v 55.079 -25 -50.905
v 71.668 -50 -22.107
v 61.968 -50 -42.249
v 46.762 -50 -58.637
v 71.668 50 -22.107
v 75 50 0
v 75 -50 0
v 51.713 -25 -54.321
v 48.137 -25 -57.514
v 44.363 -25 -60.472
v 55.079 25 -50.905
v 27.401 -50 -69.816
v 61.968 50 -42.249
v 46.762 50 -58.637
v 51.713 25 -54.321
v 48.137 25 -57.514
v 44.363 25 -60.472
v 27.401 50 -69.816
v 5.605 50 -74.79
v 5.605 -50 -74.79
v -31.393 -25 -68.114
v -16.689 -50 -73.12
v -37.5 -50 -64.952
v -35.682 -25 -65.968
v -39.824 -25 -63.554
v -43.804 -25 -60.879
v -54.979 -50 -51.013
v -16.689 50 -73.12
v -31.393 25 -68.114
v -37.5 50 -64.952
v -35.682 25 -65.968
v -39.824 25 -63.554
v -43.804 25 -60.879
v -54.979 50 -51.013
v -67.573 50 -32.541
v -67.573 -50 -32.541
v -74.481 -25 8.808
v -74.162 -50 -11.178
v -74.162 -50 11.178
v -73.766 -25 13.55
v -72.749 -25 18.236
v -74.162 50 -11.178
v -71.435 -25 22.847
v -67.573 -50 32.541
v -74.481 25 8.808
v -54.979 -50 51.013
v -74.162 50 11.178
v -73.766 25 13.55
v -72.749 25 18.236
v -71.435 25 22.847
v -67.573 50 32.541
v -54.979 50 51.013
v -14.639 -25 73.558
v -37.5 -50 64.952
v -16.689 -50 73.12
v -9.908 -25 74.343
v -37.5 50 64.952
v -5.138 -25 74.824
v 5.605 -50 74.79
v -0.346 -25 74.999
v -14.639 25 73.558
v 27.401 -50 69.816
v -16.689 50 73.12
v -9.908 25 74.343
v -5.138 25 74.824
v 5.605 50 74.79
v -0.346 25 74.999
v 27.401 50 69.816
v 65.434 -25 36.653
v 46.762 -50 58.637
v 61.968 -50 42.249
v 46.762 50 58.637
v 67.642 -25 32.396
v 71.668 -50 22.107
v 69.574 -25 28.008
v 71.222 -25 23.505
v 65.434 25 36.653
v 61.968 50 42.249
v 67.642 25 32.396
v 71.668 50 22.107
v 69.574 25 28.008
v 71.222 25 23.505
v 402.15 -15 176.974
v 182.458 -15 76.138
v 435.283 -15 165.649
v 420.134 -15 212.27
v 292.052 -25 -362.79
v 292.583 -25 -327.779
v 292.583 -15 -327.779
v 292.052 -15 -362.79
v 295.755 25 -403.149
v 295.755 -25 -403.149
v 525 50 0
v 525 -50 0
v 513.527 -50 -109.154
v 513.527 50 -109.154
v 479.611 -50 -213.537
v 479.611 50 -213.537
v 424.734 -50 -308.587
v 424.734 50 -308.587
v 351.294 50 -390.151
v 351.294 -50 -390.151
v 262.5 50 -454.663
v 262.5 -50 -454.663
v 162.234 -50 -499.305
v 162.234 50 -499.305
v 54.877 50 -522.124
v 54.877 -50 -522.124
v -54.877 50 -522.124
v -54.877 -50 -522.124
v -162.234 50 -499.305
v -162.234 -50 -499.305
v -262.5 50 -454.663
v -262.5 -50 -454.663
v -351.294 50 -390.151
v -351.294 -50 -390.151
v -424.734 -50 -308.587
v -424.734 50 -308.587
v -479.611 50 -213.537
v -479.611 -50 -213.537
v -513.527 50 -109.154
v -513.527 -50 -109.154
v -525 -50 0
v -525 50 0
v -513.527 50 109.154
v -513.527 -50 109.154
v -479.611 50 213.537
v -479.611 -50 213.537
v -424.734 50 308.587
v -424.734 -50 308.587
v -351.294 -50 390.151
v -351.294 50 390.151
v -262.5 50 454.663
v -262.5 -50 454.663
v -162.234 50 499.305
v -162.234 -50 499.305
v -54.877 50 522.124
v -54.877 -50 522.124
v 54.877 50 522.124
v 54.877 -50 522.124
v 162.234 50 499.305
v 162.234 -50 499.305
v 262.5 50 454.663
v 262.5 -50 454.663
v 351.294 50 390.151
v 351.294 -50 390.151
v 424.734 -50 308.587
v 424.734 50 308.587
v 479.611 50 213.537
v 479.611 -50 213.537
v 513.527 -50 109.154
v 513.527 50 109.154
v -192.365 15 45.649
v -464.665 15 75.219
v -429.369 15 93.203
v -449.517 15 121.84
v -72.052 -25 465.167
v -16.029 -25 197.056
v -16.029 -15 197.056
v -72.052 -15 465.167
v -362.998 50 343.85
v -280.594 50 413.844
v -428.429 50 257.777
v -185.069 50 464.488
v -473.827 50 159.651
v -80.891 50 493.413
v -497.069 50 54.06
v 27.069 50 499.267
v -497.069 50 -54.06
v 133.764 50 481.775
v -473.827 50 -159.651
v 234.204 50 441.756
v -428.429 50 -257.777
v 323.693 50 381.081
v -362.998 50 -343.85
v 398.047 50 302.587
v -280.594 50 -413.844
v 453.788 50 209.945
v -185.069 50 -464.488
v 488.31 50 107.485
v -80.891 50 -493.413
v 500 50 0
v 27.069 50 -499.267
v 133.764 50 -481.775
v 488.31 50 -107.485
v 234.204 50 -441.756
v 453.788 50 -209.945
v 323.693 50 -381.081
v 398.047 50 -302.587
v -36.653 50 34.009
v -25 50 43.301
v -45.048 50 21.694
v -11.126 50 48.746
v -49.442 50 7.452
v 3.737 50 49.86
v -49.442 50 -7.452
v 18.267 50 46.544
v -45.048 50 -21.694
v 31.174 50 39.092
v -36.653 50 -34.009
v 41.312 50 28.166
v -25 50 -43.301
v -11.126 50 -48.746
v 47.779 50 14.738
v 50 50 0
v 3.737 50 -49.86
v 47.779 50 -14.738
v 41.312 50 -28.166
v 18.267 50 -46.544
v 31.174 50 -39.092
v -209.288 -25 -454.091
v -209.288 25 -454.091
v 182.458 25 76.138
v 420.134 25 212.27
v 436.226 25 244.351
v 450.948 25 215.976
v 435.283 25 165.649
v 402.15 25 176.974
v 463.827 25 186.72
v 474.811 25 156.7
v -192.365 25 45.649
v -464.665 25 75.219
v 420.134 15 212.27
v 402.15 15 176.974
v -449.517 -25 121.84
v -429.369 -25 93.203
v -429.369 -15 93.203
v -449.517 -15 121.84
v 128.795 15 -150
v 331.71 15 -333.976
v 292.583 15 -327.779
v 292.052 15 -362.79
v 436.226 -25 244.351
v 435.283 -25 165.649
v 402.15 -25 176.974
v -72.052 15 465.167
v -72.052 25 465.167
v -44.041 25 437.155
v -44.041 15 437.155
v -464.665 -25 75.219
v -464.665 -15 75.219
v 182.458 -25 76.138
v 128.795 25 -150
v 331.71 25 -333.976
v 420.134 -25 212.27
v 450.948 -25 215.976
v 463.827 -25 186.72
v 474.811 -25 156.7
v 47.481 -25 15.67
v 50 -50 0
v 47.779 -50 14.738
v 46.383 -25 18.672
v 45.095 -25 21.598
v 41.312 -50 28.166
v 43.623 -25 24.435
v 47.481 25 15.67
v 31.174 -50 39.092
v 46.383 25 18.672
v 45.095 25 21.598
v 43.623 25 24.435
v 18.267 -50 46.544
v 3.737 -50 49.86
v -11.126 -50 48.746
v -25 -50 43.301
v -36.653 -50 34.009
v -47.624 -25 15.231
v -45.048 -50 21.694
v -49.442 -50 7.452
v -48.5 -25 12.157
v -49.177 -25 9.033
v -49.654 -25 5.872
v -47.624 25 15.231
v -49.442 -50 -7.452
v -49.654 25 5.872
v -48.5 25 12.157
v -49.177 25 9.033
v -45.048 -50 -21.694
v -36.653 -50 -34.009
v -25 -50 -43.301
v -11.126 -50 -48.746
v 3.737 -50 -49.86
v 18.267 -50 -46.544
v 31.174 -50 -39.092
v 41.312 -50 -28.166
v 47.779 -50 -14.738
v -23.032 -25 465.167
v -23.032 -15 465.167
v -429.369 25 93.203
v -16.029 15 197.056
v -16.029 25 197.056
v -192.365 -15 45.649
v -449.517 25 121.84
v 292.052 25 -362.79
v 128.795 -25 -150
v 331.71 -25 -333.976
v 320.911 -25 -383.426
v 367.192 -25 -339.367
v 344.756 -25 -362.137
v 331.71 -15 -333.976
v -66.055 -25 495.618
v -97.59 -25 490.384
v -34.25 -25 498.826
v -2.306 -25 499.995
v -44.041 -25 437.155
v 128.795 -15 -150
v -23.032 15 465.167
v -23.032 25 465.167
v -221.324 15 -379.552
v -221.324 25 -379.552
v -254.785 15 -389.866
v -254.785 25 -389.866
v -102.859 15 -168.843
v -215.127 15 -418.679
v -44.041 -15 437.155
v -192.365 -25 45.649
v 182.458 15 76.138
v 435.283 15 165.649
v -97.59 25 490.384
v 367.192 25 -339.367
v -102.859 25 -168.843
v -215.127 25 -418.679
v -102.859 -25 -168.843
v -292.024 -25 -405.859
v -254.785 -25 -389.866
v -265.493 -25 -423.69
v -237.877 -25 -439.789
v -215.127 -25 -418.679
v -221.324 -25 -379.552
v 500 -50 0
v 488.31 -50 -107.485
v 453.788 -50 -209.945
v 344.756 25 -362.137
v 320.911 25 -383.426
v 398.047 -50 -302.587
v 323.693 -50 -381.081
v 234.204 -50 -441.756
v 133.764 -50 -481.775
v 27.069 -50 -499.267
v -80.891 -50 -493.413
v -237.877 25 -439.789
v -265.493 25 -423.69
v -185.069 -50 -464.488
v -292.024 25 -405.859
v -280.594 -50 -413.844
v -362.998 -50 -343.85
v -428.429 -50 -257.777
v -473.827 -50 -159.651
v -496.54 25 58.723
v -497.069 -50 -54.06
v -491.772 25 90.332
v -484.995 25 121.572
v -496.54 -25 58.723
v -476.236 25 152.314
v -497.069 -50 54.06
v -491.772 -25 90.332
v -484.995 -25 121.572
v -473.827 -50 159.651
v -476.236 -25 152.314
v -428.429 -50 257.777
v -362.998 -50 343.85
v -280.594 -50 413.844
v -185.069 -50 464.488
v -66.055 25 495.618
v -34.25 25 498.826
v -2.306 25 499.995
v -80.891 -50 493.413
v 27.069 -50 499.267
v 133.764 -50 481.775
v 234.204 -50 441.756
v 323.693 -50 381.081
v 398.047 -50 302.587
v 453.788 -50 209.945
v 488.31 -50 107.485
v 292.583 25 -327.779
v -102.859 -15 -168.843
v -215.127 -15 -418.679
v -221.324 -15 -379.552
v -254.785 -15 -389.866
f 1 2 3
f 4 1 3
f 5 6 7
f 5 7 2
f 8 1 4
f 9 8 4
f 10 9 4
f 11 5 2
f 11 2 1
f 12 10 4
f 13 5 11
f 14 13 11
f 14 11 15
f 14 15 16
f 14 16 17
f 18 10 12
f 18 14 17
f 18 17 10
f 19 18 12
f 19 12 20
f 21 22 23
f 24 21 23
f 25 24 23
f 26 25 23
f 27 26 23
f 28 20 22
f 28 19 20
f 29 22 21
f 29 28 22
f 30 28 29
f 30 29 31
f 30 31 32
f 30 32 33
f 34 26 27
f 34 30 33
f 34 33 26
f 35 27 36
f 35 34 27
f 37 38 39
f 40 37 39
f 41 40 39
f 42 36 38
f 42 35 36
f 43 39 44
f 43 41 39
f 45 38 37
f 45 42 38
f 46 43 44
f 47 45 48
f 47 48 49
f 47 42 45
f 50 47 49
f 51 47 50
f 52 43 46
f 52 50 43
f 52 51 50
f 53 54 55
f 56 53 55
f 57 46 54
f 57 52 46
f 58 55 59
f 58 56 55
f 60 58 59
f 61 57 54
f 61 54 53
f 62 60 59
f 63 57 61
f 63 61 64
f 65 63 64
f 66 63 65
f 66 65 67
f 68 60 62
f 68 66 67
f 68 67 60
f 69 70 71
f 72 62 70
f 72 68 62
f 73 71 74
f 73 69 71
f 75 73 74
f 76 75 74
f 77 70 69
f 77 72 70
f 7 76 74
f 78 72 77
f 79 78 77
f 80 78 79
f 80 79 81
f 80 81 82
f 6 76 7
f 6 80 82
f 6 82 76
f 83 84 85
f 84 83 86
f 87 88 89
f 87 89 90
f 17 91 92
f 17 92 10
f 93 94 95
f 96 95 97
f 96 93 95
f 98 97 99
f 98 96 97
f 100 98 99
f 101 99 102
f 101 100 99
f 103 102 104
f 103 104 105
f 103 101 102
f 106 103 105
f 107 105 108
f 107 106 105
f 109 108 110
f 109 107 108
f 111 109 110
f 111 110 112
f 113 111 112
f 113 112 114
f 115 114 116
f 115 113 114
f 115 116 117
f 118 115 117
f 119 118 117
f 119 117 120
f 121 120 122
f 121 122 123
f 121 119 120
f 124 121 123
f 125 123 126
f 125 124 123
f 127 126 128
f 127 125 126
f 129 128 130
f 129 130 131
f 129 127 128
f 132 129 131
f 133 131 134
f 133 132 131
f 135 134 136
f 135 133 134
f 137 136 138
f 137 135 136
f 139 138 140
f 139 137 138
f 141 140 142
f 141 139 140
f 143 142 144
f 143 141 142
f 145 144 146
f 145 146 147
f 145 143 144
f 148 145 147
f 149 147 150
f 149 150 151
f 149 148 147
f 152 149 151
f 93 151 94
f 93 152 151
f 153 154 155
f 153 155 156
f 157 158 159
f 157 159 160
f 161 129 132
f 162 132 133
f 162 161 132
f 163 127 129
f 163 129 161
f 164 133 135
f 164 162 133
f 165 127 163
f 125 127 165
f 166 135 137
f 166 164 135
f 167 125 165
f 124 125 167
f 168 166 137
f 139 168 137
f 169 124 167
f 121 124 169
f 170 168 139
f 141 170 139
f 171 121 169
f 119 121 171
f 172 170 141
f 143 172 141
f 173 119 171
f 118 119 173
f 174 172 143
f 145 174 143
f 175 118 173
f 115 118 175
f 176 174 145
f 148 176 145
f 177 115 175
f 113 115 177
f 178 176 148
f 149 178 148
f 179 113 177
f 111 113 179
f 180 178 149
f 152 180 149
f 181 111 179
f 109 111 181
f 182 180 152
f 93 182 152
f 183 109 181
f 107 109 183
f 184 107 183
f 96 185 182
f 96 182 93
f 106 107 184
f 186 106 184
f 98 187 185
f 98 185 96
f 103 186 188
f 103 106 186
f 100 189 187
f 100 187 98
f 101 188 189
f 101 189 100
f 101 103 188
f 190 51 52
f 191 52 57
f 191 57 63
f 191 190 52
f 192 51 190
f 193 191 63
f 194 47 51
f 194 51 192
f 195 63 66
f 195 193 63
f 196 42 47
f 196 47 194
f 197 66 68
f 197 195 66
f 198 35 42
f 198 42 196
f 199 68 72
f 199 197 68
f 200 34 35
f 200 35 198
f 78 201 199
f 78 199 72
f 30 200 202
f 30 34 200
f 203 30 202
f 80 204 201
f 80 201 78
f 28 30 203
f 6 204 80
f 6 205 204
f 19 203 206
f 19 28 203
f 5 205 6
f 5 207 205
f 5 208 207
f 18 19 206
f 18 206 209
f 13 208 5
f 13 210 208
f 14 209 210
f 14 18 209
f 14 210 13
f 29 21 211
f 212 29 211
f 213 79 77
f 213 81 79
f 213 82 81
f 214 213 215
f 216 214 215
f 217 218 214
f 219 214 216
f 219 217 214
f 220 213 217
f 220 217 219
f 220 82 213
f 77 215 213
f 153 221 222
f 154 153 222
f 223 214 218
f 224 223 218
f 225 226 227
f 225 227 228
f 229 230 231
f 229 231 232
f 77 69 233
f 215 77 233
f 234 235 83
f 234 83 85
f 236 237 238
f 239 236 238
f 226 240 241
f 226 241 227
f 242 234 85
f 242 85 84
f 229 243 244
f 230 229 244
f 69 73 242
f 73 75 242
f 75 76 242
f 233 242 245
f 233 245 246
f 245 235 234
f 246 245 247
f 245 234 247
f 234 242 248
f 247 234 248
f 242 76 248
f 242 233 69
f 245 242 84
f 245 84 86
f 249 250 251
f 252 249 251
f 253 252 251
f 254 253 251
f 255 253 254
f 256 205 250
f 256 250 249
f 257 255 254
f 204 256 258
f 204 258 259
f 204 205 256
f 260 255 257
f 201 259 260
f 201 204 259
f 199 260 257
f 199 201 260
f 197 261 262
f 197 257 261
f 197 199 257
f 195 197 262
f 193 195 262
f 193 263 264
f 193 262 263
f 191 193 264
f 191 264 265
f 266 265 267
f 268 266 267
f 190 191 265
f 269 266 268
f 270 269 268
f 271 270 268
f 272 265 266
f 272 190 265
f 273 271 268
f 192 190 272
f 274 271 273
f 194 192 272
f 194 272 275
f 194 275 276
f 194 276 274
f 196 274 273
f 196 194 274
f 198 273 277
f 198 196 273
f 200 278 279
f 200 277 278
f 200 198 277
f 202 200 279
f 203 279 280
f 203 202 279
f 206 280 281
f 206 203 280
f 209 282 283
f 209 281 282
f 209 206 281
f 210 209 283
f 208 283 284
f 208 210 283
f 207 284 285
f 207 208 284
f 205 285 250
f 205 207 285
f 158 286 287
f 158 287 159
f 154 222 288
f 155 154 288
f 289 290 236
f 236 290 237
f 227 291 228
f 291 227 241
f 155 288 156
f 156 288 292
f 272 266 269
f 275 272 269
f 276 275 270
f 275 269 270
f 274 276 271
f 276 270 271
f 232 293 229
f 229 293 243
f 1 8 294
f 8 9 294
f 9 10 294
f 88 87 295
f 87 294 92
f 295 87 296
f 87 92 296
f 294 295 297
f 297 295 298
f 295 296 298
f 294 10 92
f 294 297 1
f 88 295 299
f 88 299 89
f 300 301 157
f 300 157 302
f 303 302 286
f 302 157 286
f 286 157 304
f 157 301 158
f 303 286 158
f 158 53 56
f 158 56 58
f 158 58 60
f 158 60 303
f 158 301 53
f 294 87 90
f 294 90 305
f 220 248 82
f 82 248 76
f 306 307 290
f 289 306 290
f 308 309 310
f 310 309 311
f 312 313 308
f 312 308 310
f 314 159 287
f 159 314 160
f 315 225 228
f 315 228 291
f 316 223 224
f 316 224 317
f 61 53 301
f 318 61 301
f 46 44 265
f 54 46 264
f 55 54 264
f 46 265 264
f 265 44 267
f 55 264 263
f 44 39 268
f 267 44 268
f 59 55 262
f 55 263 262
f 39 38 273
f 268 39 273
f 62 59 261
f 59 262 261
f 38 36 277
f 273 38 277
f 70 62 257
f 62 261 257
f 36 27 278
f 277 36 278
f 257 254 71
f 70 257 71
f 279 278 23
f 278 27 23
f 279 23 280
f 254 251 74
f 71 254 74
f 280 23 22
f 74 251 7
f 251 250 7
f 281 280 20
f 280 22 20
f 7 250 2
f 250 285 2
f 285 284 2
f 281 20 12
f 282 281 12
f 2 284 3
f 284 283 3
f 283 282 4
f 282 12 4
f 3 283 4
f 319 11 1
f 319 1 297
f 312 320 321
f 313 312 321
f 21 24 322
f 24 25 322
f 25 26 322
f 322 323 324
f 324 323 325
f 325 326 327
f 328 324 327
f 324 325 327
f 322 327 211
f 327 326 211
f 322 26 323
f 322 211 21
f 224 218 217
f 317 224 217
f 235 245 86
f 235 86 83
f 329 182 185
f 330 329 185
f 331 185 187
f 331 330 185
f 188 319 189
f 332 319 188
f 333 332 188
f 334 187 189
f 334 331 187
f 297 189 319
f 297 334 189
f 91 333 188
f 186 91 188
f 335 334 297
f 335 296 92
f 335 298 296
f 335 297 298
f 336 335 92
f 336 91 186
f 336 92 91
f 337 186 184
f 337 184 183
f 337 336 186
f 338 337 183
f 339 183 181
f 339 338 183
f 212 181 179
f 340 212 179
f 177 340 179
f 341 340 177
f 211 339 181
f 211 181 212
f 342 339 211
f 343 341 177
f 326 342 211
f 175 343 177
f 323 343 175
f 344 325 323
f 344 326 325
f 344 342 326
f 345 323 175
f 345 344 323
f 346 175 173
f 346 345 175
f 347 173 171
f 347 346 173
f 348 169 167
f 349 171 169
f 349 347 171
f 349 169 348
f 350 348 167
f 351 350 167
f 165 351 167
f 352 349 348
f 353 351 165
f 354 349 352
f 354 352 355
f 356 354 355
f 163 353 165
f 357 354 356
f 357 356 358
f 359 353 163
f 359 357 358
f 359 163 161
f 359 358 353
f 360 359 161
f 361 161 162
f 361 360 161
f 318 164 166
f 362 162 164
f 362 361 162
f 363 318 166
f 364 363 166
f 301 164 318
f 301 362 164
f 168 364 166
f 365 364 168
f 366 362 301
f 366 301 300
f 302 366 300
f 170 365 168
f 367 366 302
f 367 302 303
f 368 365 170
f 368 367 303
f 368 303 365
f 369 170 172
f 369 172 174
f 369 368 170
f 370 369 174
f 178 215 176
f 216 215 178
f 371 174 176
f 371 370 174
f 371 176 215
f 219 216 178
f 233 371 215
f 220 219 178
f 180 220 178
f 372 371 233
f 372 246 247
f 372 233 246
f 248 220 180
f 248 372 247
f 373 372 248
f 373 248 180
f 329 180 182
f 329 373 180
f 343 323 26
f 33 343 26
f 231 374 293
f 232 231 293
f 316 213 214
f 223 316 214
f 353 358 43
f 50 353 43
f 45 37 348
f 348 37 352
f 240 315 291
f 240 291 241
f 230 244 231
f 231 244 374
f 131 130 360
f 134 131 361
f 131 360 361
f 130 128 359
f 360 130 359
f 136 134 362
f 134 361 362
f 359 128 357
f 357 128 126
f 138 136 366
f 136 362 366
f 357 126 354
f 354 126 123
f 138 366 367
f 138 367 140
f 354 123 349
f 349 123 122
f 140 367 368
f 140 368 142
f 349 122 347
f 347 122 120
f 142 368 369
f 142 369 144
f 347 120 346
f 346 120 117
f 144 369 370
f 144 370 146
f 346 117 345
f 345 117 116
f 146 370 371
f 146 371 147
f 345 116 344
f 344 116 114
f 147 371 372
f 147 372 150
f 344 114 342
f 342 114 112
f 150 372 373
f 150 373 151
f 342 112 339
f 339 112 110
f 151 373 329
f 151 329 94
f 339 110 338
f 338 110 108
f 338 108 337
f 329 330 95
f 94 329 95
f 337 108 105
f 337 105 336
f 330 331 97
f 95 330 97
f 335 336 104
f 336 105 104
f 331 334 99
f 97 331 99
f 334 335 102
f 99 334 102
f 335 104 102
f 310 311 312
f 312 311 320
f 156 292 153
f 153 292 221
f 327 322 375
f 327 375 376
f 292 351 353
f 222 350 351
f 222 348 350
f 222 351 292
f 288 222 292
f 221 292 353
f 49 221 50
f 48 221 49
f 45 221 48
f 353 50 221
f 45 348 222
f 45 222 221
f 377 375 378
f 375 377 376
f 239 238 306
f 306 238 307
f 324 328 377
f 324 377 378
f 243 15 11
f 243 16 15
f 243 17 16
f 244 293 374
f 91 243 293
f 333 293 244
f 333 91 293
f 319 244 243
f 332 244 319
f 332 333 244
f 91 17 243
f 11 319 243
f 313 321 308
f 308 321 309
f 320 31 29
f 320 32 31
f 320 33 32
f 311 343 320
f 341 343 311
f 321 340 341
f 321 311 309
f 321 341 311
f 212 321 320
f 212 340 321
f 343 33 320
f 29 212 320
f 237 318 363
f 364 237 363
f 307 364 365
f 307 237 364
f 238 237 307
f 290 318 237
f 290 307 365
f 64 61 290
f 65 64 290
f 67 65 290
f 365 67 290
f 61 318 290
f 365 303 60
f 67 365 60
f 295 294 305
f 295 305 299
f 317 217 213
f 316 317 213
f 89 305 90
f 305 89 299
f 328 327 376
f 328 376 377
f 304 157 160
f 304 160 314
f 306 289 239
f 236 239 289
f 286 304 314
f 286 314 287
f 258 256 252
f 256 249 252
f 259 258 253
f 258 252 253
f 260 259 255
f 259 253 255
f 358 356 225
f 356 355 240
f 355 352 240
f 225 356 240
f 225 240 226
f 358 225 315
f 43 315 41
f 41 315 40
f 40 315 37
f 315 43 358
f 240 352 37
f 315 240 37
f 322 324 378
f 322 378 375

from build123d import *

# Parameters (mm, degrees)
SKETCH_1_R                      = 75
SKETCH_1_R_2                    = 50
EXTRUDE_1_DEPTH                 = 50
SKETCH_2_R                      = 525
SKETCH_2_R_2                    = 500
EXTRUDE_2_DEPTH                 = 50
EXTRUDE_4_DEPTH                 = 25
CUT_EXTRUDE_1_DEPTH             = 10
PATTERN_CIRCULAR_1_COUNT        = 5
PATTERN_CIRCULAR_1_COPY_1_DEPTH = 10
PATTERN_CIRCULAR_1_COPY_2_DEPTH = 10
PATTERN_CIRCULAR_1_COPY_3_DEPTH = 10
PATTERN_CIRCULAR_1_COPY_4_DEPTH = 10


with BuildPart() as part:
    # 草图1 → 凸台-拉伸1 (new body, symmetric)
    with BuildSketch(Plane(origin=(0, 0, 0), x_dir=(1, 0, 0), z_dir=(0, 1, 0))):
        Circle(SKETCH_1_R)
        Circle(SKETCH_1_R_2, mode=Mode.SUBTRACT)
    extrude(amount=EXTRUDE_1_DEPTH, both=True)



with BuildPart() as body_2:
    # 草图2 → 凸台-拉伸2 (new body, symmetric)
    with BuildSketch(Plane(origin=(0, 0, 0), x_dir=(1, 0, 0), z_dir=(0, 1, 0))):
        Circle(SKETCH_2_R)
        Circle(SKETCH_2_R_2, mode=Mode.SUBTRACT)
    extrude(amount=EXTRUDE_2_DEPTH, both=True)


with BuildPart() as part_1:
    add(part.part)

    add(body_2.part)  # 凸台-拉伸4 merges body 2
    # 草图3 → 凸台-拉伸4 (add, symmetric)
    with BuildSketch(Plane(origin=(0, 0, 0), x_dir=(1, 0, 0), z_dir=(0, 1, 0))):
        with BuildLine():
            Line((487.740991927, -160.966827682), (47.481076098, -15.669952538))
            ThreePointArc((47.481076098, -15.669952538), (45.762156741, -20.145098917), (43.622562007, -24.435058502))
            Line((43.622562007, -24.435058502), (449.989958214, -252.06064129))
            Line((449.989958214, -252.06064129), (487.740991927, -160.966827682))
        make_face()
        with BuildLine():
            ThreePointArc((-0.230551046, -49.999468459), (-5.017843464, -49.747575287), (-9.759008616, -49.038370189))
            Line((-9.759008616, -49.038370189), (-100.669371014, -505.856903799))
            Line((-100.669371014, -505.856903799), (-2.368295015, -513.610733921))
            Line((-2.368295015, -513.610733921), (-0.230551046, -49.999468459))
        make_face()
        with BuildLine():
            ThreePointArc((-47.623564481, -15.231418389), (-48.863354552, -10.600593468), (-49.653961028, -5.872321028))
            Line((-49.653961028, -5.872321028), (-512.207051127, -60.576118701))
            Line((-512.207051127, -60.576118701), (-489.204678742, -156.462062868))
            Line((-489.204678742, -156.462062868), (-47.623564481, -15.231418389))
        make_face()
        with BuildLine():
            ThreePointArc((-29.202430469, 40.585934198), (-25.181370454, 43.196048223), (-20.928826975, 45.409076201))
            Line((-20.928826975, 45.409076201), (-215.89199586, 468.418803535))
            Line((-215.89199586, 468.418803535), (-299.976823903, 416.911861118))
            Line((-299.976823903, 416.911861118), (-29.202430469, 40.585934198))
        make_face()
        with BuildLine():
            ThreePointArc((29.575469897, 40.314905189), (33.300411729, 37.29721945), (36.719234612, 33.936673518))
            Line((36.719234612, 33.936673518), (378.778459787, 350.074860255))
            Line((378.778459787, 350.074860255), (303.808805733, 414.127763353))
            Line((303.808805733, 414.127763353), (29.575469897, 40.314905189))
        make_face()
    extrude(amount=EXTRUDE_4_DEPTH, both=True)

    # 草图4 → 切除-拉伸1 (cut)
    with BuildSketch(Plane.XZ.offset(25)):
        Polygon((-72.052388825, 465.166723777), (-44.040818004, 437.155152956), (-23.032139887, 465.166723777), (-16.029247182, 197.055974487), align=None)
    cut_extrude_1 = extrude(amount=-CUT_EXTRUDE_1_DEPTH, mode=Mode.SUBTRACT)

    # 镜向1: 切除-拉伸1 across plane
    add(cut_extrude_1.mirror(Plane.ZX), mode=Mode.SUBTRACT)

    # 阵列(圆周)1: 切除-拉伸1 ×5 about axis
    pattern_circular_1_axis = Axis((0, 0, 0), (0, 1, 0))
    for i in range(1, PATTERN_CIRCULAR_1_COUNT):
        add(cut_extrude_1.rotate(pattern_circular_1_axis, i * 360 / PATTERN_CIRCULAR_1_COUNT), mode=Mode.SUBTRACT)

    # 阵列(圆周)1 copy 1 sketch → 阵列(圆周)1 copy 1 (cut)
    with BuildSketch(Plane(origin=(0, 25, 0), x_dir=(0.309016994, 0, -0.951056516), z_dir=(0, 1, 0))):
        Polygon((-72.052388825, -465.166723777), (-44.040818004, -437.155152956), (-23.032139887, -465.166723777), (-16.029247182, -197.055974487), align=None)
    extrude(amount=-PATTERN_CIRCULAR_1_COPY_1_DEPTH, mode=Mode.SUBTRACT)

    # 阵列(圆周)1 copy 2 sketch → 阵列(圆周)1 copy 2 (cut)
    with BuildSketch(Plane(origin=(0, 25, 0), x_dir=(-0.809016994, 0, -0.587785252), z_dir=(0, 1, 0))):
        Polygon((-72.052388825, -465.166723777), (-44.040818004, -437.155152956), (-23.032139887, -465.166723777), (-16.029247182, -197.055974487), align=None)
    extrude(amount=-PATTERN_CIRCULAR_1_COPY_2_DEPTH, mode=Mode.SUBTRACT)

    # 阵列(圆周)1 copy 3 sketch → 阵列(圆周)1 copy 3 (cut)
    with BuildSketch(Plane(origin=(0, 25, 0), x_dir=(-0.809016994, 0, 0.587785252), z_dir=(0, 1, 0))):
        Polygon((-72.052388825, -465.166723777), (-44.040818004, -437.155152956), (-23.032139887, -465.166723777), (-16.029247182, -197.055974487), align=None)
    extrude(amount=-PATTERN_CIRCULAR_1_COPY_3_DEPTH, mode=Mode.SUBTRACT)

    # 阵列(圆周)1 copy 4 sketch → 阵列(圆周)1 copy 4 (cut)
    with BuildSketch(Plane(origin=(0, 25, 0), x_dir=(0.309016994, 0, 0.951056516), z_dir=(0, 1, 0))):
        Polygon((-72.052388825, -465.166723777), (-44.040818004, -437.155152956), (-23.032139887, -465.166723777), (-16.029247182, -197.055974487), align=None)
    extrude(amount=-PATTERN_CIRCULAR_1_COPY_4_DEPTH, mode=Mode.SUBTRACT)


solid = part_1.part
